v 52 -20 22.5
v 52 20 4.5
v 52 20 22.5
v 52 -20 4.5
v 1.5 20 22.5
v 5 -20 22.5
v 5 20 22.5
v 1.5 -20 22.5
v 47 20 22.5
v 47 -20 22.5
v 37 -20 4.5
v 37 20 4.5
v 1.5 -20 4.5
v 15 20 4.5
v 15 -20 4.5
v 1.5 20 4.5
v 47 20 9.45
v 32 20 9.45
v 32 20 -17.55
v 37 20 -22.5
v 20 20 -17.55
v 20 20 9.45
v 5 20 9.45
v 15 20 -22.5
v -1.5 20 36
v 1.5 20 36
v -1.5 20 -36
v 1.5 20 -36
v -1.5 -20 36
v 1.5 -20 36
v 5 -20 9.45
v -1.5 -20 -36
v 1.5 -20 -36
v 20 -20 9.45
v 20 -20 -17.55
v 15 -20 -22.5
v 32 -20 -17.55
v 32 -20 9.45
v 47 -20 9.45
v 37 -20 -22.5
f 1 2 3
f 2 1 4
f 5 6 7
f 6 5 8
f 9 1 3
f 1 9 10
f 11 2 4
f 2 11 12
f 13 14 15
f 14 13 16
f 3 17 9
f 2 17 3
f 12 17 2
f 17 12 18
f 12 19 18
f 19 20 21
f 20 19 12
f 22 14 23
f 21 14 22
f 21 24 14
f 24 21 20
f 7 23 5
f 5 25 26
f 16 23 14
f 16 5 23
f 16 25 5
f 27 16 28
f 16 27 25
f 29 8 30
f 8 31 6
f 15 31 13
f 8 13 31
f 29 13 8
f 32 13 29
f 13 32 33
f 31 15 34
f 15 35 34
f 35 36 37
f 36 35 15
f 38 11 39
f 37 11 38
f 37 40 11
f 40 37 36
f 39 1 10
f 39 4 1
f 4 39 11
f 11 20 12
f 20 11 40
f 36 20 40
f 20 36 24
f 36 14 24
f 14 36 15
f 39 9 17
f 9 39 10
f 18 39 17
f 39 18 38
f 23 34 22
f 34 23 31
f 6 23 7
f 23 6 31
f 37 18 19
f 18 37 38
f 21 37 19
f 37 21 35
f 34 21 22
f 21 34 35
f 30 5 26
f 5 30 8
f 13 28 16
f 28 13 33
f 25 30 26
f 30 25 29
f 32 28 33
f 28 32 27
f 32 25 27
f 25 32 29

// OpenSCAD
module t(x1,x2,width,h1,h2){
    union(){
        translate([0,0,(h2)/2]){
            cube([x1,width,h1-h2],center=true);
        }
        cube([x2,width,h1],center=true);
    }
};

module hanger(bordureWidth = 5){
    difference(){
        t(42+bordureWidth*2,12+bordureWidth*2,40,40+bordureWidth,27);
        translate([0,0,5/2]){
            t(42,12,40+0.5,40+0.1,27);
        }
    }
}

cube(size=[3,40,72], center = true);
translate([(42+5*2)/2,0,0]){
    hanger(5);
}
